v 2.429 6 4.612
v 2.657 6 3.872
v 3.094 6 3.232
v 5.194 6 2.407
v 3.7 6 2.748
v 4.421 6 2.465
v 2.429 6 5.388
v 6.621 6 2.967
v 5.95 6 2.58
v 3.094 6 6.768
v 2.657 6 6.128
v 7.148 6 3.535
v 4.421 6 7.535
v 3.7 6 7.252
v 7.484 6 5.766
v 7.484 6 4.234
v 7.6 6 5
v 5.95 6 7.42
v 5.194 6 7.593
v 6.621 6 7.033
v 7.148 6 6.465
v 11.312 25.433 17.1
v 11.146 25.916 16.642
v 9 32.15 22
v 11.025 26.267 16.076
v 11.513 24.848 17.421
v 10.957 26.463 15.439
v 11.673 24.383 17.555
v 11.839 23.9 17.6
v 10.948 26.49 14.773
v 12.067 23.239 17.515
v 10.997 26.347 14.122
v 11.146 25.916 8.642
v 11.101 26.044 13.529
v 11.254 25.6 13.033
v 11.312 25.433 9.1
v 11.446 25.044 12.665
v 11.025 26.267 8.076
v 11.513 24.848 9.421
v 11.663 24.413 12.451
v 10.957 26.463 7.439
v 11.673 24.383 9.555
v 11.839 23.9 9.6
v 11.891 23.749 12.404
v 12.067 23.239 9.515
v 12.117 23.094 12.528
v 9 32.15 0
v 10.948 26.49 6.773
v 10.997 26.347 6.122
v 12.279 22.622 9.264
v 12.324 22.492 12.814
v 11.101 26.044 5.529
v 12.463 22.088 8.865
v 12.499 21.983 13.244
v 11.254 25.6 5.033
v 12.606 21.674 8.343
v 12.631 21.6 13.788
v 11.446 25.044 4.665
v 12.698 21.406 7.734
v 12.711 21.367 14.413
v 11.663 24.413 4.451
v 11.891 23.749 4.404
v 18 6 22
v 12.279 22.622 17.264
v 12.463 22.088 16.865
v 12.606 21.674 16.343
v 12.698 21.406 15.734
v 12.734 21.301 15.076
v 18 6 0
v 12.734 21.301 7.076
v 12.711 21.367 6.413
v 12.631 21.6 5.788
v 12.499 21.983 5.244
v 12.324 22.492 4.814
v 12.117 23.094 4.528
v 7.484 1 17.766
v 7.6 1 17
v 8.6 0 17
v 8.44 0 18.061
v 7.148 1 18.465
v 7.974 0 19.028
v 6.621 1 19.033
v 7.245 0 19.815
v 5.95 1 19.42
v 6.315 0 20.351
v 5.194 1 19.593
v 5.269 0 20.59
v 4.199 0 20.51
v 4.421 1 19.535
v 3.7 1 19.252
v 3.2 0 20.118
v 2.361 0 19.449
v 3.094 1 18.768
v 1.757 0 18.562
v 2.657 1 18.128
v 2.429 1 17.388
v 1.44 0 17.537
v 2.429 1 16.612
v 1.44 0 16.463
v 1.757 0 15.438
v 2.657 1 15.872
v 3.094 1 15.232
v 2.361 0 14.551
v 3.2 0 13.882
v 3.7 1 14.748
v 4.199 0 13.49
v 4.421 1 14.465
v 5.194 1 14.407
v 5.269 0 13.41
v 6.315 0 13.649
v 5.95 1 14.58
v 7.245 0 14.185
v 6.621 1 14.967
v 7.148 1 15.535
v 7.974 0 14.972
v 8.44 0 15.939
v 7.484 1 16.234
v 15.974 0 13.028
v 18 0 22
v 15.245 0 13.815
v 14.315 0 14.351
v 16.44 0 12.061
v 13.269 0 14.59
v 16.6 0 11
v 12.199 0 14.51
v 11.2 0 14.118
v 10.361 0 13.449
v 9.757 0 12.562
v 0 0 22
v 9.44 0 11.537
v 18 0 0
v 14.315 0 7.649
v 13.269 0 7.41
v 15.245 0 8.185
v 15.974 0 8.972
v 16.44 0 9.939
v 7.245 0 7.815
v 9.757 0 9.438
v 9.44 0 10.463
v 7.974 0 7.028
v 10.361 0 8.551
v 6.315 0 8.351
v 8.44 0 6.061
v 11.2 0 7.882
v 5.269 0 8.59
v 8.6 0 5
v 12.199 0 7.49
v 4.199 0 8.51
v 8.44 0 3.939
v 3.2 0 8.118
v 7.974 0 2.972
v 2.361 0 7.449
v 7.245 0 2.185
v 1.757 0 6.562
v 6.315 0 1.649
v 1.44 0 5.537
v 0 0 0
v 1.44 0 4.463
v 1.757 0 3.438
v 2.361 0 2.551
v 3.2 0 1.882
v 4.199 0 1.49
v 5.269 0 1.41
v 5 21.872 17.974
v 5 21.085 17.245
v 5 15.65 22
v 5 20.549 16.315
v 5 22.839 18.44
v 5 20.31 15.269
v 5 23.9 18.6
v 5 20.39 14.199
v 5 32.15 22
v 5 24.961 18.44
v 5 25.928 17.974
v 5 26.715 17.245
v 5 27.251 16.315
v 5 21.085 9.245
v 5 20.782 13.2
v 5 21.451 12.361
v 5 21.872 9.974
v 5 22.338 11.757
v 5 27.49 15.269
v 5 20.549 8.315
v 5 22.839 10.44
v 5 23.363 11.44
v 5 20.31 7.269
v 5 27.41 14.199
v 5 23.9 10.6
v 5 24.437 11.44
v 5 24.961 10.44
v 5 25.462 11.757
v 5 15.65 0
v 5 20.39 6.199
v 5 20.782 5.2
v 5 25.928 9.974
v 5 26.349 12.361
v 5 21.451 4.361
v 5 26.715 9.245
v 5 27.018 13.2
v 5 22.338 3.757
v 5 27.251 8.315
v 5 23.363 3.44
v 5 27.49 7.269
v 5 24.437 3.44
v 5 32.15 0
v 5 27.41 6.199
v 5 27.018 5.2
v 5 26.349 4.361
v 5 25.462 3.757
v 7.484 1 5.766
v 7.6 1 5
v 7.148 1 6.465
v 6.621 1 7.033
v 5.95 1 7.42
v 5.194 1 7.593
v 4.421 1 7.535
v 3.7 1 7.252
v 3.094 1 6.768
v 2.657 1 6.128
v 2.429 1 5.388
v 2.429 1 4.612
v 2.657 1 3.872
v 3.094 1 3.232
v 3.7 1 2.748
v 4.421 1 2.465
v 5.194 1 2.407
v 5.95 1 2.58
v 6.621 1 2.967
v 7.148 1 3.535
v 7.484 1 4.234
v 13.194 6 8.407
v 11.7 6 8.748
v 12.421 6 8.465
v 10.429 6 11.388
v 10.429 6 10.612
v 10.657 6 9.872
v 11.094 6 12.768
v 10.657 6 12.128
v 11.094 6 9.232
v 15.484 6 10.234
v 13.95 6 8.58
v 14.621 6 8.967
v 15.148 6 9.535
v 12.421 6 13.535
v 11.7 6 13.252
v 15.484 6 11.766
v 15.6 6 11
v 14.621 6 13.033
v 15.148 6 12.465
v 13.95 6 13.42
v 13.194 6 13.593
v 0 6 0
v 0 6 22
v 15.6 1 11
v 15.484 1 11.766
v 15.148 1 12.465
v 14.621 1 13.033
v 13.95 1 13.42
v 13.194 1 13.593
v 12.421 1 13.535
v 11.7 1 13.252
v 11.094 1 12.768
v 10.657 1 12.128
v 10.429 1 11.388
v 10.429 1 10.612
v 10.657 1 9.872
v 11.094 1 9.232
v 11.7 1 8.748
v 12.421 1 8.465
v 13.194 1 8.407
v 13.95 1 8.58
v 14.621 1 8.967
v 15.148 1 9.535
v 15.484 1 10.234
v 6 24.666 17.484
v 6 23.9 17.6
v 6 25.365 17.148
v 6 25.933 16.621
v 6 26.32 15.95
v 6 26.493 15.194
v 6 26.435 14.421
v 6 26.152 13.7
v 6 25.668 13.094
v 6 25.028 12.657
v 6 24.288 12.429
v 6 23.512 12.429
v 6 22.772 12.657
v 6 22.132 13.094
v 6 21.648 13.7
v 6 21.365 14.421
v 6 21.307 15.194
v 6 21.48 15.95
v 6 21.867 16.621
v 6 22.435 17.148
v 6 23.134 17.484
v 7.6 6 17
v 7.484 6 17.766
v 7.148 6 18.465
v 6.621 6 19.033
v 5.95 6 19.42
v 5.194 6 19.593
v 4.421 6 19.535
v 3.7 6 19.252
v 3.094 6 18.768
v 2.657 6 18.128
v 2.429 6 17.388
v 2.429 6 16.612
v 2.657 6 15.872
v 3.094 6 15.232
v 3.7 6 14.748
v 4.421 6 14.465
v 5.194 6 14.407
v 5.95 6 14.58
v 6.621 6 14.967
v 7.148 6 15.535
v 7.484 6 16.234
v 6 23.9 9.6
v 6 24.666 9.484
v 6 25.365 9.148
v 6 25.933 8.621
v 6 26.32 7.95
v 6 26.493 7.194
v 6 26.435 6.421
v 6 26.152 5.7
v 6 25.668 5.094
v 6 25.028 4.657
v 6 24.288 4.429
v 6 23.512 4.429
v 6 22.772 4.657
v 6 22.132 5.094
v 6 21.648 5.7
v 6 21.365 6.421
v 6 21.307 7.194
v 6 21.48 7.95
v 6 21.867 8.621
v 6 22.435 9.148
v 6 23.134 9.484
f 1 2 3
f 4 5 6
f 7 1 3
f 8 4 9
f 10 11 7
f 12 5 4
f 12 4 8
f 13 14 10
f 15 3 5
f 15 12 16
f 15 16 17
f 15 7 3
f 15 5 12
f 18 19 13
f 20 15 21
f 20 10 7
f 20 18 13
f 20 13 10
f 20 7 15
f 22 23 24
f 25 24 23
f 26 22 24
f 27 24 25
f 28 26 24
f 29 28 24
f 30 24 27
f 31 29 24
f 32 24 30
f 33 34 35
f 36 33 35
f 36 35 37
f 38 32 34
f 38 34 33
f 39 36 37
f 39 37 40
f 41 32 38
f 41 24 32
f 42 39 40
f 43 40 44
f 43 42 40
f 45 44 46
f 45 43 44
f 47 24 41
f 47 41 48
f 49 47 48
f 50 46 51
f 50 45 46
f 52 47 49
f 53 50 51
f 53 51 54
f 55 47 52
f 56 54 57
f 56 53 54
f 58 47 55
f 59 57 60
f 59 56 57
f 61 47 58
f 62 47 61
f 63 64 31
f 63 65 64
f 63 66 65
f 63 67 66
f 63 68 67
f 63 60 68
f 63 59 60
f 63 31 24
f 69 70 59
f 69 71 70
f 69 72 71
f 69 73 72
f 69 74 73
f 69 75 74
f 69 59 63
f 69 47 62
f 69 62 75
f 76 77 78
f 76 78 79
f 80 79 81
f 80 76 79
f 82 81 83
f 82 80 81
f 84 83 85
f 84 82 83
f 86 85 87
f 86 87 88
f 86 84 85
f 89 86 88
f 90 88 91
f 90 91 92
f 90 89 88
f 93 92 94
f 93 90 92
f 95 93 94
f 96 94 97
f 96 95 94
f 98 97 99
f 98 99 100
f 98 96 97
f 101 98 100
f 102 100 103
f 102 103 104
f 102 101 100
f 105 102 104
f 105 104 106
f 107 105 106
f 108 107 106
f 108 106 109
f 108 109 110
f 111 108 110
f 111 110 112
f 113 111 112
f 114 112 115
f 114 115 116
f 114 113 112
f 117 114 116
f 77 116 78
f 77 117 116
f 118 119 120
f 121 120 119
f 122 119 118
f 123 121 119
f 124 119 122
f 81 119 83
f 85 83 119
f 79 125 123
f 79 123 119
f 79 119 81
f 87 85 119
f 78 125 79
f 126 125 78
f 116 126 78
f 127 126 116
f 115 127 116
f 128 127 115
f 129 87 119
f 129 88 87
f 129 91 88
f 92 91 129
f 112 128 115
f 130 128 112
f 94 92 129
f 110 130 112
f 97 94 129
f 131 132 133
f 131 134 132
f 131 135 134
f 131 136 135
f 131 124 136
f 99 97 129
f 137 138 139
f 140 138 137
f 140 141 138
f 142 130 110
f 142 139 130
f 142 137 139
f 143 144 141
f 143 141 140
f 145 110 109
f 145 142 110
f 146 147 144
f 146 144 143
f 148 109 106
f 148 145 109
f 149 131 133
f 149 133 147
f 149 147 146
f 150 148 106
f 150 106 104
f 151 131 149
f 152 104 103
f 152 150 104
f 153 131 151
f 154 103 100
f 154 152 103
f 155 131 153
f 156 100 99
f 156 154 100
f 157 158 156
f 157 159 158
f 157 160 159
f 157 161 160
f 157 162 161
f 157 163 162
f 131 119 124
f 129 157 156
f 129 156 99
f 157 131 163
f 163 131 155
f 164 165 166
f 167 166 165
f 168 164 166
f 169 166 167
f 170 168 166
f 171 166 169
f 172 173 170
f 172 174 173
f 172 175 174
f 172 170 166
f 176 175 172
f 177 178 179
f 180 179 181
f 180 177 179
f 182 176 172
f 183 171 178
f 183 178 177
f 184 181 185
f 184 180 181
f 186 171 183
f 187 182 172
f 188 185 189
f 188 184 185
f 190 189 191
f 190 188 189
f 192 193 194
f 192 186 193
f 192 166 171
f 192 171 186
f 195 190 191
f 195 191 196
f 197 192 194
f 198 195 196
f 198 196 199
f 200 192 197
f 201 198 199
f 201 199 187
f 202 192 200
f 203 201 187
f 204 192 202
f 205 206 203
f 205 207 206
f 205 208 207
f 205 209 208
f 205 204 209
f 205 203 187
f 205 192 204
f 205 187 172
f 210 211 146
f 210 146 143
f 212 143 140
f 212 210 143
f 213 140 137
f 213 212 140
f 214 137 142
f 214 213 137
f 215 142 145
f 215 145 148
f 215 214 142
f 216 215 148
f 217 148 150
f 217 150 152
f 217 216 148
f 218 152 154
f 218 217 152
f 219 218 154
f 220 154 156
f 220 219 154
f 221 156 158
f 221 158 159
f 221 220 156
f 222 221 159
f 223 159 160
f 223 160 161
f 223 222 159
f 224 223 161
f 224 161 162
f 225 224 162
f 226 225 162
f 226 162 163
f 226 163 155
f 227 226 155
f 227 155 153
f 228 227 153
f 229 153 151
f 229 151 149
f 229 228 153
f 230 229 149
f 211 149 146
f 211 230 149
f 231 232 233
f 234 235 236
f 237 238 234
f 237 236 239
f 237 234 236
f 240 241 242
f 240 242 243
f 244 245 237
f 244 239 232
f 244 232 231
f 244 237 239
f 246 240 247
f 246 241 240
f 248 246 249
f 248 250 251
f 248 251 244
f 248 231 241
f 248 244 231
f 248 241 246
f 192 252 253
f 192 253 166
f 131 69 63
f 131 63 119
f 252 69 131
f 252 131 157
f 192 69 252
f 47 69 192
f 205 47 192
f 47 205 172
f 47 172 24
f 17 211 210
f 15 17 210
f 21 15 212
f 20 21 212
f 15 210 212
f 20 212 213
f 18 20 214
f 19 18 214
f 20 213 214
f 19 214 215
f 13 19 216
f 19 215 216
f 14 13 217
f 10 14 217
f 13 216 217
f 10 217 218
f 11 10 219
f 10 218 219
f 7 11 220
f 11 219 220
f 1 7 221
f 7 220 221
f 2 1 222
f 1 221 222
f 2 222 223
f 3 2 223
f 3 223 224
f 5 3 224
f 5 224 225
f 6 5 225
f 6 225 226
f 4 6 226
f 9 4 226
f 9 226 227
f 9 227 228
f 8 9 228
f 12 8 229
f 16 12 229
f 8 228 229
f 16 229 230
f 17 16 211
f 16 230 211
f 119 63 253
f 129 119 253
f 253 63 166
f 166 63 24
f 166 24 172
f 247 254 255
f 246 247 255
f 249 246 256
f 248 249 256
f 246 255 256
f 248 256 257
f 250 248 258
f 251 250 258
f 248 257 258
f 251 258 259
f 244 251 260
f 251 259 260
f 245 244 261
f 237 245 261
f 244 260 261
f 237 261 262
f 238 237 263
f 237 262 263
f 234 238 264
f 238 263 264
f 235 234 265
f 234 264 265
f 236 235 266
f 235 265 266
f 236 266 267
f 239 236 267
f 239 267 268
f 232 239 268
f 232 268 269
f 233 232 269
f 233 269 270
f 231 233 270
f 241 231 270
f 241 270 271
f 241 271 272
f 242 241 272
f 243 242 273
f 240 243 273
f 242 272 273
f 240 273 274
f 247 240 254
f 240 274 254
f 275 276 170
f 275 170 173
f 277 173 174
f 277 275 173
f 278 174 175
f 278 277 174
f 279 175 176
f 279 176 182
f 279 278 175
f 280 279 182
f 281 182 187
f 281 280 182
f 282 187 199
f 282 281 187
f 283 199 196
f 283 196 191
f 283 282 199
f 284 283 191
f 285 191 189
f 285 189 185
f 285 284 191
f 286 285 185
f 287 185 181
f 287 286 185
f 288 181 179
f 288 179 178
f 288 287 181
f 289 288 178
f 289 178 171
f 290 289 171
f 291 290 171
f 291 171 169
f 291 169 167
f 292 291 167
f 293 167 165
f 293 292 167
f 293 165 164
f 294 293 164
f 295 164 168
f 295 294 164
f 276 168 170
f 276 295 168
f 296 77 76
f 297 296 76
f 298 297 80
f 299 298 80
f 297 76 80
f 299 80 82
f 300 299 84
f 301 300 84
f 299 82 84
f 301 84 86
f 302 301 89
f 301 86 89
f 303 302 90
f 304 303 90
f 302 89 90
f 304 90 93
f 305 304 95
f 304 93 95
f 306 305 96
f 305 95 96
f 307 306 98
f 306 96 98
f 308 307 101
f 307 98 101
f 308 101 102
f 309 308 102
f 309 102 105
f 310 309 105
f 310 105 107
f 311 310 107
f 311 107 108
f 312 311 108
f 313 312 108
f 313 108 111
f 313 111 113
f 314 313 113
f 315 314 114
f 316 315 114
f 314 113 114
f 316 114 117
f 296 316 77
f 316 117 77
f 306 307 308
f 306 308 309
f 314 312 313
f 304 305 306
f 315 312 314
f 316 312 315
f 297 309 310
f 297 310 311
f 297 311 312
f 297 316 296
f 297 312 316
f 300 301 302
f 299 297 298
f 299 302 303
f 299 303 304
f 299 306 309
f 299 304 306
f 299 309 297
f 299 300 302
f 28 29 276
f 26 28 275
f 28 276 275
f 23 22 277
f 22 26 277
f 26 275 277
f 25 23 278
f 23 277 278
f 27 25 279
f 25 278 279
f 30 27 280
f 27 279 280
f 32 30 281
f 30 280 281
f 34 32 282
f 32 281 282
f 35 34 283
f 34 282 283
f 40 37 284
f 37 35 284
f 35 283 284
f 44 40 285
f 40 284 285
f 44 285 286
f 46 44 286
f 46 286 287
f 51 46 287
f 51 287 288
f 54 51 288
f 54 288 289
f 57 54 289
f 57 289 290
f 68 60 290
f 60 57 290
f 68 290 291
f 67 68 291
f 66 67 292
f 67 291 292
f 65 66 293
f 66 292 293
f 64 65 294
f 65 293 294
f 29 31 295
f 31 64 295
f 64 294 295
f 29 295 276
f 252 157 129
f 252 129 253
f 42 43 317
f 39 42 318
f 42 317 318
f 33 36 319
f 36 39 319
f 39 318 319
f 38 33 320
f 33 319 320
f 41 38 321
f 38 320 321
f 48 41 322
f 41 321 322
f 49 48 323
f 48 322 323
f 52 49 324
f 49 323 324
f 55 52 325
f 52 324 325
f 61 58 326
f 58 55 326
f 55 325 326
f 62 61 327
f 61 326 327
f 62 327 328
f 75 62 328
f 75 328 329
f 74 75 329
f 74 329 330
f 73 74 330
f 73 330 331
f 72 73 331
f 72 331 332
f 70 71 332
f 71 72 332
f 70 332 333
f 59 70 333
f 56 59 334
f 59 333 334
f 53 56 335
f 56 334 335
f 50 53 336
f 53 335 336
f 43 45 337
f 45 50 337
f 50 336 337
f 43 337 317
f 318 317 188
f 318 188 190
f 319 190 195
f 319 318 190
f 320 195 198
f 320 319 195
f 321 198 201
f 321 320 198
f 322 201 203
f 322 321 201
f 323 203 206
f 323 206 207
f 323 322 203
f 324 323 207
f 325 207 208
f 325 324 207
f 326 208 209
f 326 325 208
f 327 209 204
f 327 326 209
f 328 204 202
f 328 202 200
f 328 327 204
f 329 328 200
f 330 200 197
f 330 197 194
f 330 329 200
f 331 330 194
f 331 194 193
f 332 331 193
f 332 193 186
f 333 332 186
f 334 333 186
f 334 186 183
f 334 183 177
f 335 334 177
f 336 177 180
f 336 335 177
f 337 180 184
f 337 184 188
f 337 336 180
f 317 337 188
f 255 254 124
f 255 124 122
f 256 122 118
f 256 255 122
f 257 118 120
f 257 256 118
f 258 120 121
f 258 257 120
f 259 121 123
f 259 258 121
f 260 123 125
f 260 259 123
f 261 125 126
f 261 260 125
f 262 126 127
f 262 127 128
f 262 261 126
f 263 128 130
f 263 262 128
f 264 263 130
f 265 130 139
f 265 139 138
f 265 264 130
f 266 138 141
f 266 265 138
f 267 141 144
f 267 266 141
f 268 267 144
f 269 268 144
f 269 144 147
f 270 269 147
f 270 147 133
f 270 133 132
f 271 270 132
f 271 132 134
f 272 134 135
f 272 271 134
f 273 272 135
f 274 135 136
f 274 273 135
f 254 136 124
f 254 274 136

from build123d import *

# Parameters (mm, degrees)
BOSS_EXTRUDE1_DEPTH = 22
SKETCH2_R           = 2.6
CUT_EXTRUDE1_DEPTH  = 14
SKETCH3_R           = 2.6
CUT_EXTRUDE2_DEPTH  = 6
CHAMFER1_SIZE       = 1


with BuildPart() as part:
    # Sketch1 → Boss-Extrude1 (new body)
    with BuildSketch(Plane.XY):
        Polygon((0, 0), (0, 6), (5, 15.65), (5, 32.15), (9, 32.15), (18, 6), (18, 0), align=None)
    extrude(amount=BOSS_EXTRUDE1_DEPTH)

    # Sketch2 → Cut-Extrude1 (cut, through all)
    with BuildSketch(Plane.ZY.offset(-5)):
        with Locations((7, 23.9)):
            Circle(SKETCH2_R)
        with Locations((15, 23.9)):
            Circle(SKETCH2_R)
    extrude(amount=-CUT_EXTRUDE1_DEPTH, mode=Mode.SUBTRACT)

    # Sketch3 → Cut-Extrude2 (cut)
    with BuildSketch(Plane.XZ):
        with Locations((5, 17)):
            Circle(SKETCH3_R)
        with Locations((13, 11)):
            Circle(SKETCH3_R)
        with Locations((5, 5)):
            Circle(SKETCH3_R)
    extrude(amount=-CUT_EXTRUDE2_DEPTH, mode=Mode.SUBTRACT)

    # Chamfer1
    chamfer1_edges = [part.edges().sort_by_distance(p)[0] for p in [
        (5, 23.9, 4.4),
        (5, 23.9, 12.4),
        (2.4, 0, 17),
        (10.4, 0, 11),
        (2.4, 0, 5),
    ]]
    chamfer(chamfer1_edges, length=CHAMFER1_SIZE)


solid = part.part
